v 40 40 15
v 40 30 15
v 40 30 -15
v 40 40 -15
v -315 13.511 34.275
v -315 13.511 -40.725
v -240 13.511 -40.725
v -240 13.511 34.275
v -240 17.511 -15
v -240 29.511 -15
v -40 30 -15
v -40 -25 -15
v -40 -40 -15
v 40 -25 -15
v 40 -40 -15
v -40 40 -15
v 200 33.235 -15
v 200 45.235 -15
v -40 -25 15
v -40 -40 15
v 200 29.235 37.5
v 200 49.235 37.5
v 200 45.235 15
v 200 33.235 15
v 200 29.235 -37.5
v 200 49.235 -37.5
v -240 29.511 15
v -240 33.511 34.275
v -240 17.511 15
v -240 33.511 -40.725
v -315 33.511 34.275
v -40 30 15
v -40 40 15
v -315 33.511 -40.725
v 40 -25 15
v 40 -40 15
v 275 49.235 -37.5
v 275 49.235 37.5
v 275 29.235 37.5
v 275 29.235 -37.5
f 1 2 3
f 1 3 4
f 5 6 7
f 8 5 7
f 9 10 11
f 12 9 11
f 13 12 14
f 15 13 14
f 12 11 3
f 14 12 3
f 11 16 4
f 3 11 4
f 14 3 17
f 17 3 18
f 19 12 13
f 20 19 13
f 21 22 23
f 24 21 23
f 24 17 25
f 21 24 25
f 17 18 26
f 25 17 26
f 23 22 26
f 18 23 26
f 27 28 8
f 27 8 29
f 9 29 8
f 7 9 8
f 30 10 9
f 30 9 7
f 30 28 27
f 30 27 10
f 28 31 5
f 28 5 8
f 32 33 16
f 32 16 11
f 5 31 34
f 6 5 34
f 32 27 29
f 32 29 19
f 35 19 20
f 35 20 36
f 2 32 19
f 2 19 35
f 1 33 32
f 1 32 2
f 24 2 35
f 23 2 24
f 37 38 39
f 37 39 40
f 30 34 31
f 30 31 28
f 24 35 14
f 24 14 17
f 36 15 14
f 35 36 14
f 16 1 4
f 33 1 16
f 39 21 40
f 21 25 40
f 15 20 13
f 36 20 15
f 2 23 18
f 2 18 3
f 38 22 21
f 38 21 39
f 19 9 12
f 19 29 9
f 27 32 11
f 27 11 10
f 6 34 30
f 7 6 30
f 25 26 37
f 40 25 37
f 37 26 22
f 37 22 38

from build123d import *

# Parameters (mm, degrees)
BOSS_EXTRUDE1_DEPTH = 15
SKETCH2_W           = 75
SKETCH2_H           = 75
BOSS_EXTRUDE2_DEPTH = 20
SKETCH3_W           = 75
SKETCH3_H           = 75
BOSS_EXTRUDE3_DEPTH = 20


with BuildPart() as part:
    # Sketch1 → Boss-Extrude1 (new body, symmetric)
    with BuildSketch(Plane.XY):
        Polygon((-40, -25), (-40, -40), (40, -40), (40, -25), (200, 33.235237483), (200, 29.235237483), (257, 29.235237483), (257, 49.235237483), (200, 49.235237483), (200, 45.235237483), (40, 30), (40, 40), (-40, 40), (-40, 30), (-240, 29.511312334), (-240, 33.511312334), (-297, 33.511312334), (-297, 13.511312334), (-240, 13.511312334), (-240, 17.511312334), align=None)
    extrude(amount=BOSS_EXTRUDE1_DEPTH, both=True)

    # Sketch2 → Boss-Extrude2 (add)
    with BuildSketch(Plane(origin=(0, 33.511312334, 0), x_dir=(1, 0, 0), z_dir=(0, 1, 0))):
        with Locations((-277.5, 3.224825952)):
            Rectangle(SKETCH2_W, SKETCH2_H)
    extrude(amount=-BOSS_EXTRUDE2_DEPTH)

    # Sketch3 → Boss-Extrude3 (add)
    with BuildSketch(Plane(origin=(0, 49.235237483, 0), x_dir=(1, 0, 0), z_dir=(0, 1, 0))):
        with Locations((237.5, 0)):
            Rectangle(SKETCH3_W, SKETCH3_H)
    extrude(amount=-BOSS_EXTRUDE3_DEPTH)


solid = part.part
